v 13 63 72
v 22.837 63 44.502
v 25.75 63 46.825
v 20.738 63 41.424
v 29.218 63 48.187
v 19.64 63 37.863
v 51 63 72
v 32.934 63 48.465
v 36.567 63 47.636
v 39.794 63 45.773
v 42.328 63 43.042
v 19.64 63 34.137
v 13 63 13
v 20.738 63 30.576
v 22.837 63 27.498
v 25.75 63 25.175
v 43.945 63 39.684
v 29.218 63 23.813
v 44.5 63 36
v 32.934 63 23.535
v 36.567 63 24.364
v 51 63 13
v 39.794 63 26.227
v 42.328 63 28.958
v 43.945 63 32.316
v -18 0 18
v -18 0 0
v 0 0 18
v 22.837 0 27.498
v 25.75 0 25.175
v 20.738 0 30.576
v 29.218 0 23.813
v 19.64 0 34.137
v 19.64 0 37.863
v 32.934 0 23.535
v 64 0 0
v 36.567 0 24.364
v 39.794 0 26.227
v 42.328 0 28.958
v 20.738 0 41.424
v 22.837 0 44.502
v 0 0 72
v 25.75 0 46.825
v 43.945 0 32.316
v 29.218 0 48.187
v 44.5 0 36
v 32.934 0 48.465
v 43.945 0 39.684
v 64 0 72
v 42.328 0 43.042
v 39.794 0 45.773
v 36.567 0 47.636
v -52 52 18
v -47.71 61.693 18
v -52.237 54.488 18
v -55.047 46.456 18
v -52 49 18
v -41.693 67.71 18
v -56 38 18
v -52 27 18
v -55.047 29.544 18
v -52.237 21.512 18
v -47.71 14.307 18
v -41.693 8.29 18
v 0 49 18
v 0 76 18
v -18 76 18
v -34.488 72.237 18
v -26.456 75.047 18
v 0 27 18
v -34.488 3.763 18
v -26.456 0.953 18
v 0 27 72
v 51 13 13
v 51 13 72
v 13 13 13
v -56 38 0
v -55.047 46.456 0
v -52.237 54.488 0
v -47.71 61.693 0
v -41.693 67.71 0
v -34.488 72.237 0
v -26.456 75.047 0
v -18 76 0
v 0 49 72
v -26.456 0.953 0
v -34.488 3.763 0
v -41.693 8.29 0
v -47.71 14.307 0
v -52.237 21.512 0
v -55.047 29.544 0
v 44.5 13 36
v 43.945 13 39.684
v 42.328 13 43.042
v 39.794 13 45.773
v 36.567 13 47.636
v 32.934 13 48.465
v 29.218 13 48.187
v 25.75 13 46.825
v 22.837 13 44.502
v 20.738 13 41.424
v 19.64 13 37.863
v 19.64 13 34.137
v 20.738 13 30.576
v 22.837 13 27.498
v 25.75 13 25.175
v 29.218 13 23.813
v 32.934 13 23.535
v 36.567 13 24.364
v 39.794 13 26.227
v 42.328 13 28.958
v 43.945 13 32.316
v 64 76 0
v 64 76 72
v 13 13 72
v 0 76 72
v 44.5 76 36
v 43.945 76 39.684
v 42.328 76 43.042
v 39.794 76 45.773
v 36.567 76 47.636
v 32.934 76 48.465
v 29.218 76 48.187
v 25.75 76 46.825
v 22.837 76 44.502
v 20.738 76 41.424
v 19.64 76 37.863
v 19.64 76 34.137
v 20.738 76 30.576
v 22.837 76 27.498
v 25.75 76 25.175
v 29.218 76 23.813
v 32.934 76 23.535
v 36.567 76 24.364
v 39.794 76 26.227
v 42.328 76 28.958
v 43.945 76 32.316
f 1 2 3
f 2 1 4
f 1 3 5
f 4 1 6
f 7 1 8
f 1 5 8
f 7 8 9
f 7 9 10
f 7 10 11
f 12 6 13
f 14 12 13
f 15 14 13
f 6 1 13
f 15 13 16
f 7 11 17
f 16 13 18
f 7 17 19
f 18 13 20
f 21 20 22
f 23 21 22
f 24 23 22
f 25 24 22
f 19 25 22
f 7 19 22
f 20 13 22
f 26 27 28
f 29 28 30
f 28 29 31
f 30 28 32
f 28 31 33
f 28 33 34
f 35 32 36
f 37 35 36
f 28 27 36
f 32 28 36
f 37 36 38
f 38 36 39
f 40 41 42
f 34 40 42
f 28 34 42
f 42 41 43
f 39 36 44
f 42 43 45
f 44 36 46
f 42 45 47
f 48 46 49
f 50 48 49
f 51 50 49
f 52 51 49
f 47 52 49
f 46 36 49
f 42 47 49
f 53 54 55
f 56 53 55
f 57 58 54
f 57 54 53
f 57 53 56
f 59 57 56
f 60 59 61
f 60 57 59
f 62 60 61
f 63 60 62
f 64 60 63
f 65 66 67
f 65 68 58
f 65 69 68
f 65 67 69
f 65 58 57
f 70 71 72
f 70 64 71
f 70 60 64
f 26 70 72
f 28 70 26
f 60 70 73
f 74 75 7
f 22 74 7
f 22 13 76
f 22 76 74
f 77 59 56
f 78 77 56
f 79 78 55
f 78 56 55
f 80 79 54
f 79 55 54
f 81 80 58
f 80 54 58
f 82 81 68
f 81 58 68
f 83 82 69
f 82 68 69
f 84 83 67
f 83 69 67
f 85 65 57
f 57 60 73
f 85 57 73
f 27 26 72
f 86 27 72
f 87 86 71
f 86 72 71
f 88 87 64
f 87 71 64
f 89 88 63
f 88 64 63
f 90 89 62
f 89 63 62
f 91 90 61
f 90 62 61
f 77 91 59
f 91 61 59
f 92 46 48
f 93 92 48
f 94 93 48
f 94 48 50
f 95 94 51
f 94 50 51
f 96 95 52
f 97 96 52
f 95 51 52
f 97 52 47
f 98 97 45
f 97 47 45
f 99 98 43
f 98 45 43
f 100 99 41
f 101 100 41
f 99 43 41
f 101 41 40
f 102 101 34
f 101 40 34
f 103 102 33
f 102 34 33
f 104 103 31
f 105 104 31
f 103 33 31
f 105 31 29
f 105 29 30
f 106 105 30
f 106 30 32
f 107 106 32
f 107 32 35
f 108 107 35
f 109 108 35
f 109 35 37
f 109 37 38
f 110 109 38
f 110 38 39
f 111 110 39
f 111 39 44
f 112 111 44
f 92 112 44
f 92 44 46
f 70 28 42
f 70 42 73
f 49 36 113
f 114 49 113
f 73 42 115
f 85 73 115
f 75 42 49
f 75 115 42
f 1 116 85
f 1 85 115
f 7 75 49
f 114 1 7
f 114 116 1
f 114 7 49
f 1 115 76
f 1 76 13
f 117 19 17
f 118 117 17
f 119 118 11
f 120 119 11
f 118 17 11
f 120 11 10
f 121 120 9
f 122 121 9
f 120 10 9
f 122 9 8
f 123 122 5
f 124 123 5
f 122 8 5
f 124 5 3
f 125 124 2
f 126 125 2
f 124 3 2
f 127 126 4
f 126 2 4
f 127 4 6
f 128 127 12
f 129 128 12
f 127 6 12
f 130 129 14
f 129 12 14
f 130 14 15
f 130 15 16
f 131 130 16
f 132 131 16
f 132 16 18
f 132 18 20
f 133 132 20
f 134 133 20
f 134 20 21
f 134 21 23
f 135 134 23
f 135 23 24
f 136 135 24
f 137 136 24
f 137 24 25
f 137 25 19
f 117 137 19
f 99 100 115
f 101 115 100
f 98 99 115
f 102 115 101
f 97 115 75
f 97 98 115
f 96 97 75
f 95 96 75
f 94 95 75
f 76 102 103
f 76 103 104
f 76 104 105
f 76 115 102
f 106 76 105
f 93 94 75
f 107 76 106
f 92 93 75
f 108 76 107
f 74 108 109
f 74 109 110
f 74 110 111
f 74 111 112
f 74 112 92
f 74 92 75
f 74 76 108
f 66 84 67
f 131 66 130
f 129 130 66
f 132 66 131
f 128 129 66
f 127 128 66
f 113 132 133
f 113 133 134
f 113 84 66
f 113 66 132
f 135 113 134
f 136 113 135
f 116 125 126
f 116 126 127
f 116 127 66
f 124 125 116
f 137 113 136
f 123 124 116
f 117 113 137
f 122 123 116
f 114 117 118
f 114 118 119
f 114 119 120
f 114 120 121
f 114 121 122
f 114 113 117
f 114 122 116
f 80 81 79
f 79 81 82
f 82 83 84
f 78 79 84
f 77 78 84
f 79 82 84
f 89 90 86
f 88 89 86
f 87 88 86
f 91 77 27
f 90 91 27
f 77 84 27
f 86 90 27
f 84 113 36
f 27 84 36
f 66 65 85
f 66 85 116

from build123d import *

# Parameters (mm, degrees)
F0_W      = 64
F0_H      = 76
F1_DEPTH  = 72
F2_T      = -13
F3_R      = 12.5
F4_DEPTH  = 100
F5_W      = 76
F5_H      = 18
F6_DEPTH  = 56
F8_DEPTH  = 25
F9_W      = 22
F9_H      = 54
F10_DEPTH = 52
F12_DEPTH = 25


with BuildPart() as f1:
    # F0 (on Top) → F1 (new body)
    with BuildSketch(Plane.XY):
        with Locations((32, 38)):
            Rectangle(F0_W, F0_H)
    extrude(amount=F1_DEPTH)

    # F2
    f2_openings = [f1.faces().sort_by_distance(p)[0] for p in [
        (32, 38, 72),
    ]]
    offset(amount=F2_T, openings=f2_openings)

    # F3 (on face) → F4 (cut)
    with BuildSketch(Plane.XZ):
        with Locations((32, 36)):
            Circle(F3_R)
    extrude(amount=-F4_DEPTH, mode=Mode.SUBTRACT)

    # F5 (on face) → F6 (join)
    with BuildSketch(Plane(origin=(0, 0, 0), x_dir=(0, -1, 0), z_dir=(-1, 0, 0))):
        with Locations((-38, 9)):
            Rectangle(F5_W, F5_H)
    extrude(amount=F6_DEPTH)

    # F7 (on face) → F8 (cut)
    with BuildSketch(Plane.XY.offset(18)):
        with BuildLine():
            ThreePointArc((-56, 38), (-44.870058, 64.870058), (-18, 76))
            Line((-18, 76), (-56, 76))
            Line((-56, 76), (-56, 38))
        make_face()
        with BuildLine():
            ThreePointArc((-18, 0), (-44.870058, 11.129942), (-56, 38))
            Line((-56, 38), (-56, 0))
            Line((-56, 0), (-18, 0))
        make_face()
    extrude(amount=-F8_DEPTH, mode=Mode.SUBTRACT)

    # F9 (on face) → F10 (join)
    with BuildSketch(Plane(origin=(0, 0, 0), x_dir=(0, -1, 0), z_dir=(-1, 0, 0))):
        with Locations((-38, 45)):
            Rectangle(F9_W, F9_H)
    extrude(amount=F10_DEPTH)

    # F11 (on face) → F12 (cut)
    with BuildSketch(Plane.XZ.offset(-27)):
        Polygon((-52, 18), (0, 72), (-52, 72), align=None)
    extrude(amount=-F12_DEPTH, mode=Mode.SUBTRACT)


solid = f1.part
